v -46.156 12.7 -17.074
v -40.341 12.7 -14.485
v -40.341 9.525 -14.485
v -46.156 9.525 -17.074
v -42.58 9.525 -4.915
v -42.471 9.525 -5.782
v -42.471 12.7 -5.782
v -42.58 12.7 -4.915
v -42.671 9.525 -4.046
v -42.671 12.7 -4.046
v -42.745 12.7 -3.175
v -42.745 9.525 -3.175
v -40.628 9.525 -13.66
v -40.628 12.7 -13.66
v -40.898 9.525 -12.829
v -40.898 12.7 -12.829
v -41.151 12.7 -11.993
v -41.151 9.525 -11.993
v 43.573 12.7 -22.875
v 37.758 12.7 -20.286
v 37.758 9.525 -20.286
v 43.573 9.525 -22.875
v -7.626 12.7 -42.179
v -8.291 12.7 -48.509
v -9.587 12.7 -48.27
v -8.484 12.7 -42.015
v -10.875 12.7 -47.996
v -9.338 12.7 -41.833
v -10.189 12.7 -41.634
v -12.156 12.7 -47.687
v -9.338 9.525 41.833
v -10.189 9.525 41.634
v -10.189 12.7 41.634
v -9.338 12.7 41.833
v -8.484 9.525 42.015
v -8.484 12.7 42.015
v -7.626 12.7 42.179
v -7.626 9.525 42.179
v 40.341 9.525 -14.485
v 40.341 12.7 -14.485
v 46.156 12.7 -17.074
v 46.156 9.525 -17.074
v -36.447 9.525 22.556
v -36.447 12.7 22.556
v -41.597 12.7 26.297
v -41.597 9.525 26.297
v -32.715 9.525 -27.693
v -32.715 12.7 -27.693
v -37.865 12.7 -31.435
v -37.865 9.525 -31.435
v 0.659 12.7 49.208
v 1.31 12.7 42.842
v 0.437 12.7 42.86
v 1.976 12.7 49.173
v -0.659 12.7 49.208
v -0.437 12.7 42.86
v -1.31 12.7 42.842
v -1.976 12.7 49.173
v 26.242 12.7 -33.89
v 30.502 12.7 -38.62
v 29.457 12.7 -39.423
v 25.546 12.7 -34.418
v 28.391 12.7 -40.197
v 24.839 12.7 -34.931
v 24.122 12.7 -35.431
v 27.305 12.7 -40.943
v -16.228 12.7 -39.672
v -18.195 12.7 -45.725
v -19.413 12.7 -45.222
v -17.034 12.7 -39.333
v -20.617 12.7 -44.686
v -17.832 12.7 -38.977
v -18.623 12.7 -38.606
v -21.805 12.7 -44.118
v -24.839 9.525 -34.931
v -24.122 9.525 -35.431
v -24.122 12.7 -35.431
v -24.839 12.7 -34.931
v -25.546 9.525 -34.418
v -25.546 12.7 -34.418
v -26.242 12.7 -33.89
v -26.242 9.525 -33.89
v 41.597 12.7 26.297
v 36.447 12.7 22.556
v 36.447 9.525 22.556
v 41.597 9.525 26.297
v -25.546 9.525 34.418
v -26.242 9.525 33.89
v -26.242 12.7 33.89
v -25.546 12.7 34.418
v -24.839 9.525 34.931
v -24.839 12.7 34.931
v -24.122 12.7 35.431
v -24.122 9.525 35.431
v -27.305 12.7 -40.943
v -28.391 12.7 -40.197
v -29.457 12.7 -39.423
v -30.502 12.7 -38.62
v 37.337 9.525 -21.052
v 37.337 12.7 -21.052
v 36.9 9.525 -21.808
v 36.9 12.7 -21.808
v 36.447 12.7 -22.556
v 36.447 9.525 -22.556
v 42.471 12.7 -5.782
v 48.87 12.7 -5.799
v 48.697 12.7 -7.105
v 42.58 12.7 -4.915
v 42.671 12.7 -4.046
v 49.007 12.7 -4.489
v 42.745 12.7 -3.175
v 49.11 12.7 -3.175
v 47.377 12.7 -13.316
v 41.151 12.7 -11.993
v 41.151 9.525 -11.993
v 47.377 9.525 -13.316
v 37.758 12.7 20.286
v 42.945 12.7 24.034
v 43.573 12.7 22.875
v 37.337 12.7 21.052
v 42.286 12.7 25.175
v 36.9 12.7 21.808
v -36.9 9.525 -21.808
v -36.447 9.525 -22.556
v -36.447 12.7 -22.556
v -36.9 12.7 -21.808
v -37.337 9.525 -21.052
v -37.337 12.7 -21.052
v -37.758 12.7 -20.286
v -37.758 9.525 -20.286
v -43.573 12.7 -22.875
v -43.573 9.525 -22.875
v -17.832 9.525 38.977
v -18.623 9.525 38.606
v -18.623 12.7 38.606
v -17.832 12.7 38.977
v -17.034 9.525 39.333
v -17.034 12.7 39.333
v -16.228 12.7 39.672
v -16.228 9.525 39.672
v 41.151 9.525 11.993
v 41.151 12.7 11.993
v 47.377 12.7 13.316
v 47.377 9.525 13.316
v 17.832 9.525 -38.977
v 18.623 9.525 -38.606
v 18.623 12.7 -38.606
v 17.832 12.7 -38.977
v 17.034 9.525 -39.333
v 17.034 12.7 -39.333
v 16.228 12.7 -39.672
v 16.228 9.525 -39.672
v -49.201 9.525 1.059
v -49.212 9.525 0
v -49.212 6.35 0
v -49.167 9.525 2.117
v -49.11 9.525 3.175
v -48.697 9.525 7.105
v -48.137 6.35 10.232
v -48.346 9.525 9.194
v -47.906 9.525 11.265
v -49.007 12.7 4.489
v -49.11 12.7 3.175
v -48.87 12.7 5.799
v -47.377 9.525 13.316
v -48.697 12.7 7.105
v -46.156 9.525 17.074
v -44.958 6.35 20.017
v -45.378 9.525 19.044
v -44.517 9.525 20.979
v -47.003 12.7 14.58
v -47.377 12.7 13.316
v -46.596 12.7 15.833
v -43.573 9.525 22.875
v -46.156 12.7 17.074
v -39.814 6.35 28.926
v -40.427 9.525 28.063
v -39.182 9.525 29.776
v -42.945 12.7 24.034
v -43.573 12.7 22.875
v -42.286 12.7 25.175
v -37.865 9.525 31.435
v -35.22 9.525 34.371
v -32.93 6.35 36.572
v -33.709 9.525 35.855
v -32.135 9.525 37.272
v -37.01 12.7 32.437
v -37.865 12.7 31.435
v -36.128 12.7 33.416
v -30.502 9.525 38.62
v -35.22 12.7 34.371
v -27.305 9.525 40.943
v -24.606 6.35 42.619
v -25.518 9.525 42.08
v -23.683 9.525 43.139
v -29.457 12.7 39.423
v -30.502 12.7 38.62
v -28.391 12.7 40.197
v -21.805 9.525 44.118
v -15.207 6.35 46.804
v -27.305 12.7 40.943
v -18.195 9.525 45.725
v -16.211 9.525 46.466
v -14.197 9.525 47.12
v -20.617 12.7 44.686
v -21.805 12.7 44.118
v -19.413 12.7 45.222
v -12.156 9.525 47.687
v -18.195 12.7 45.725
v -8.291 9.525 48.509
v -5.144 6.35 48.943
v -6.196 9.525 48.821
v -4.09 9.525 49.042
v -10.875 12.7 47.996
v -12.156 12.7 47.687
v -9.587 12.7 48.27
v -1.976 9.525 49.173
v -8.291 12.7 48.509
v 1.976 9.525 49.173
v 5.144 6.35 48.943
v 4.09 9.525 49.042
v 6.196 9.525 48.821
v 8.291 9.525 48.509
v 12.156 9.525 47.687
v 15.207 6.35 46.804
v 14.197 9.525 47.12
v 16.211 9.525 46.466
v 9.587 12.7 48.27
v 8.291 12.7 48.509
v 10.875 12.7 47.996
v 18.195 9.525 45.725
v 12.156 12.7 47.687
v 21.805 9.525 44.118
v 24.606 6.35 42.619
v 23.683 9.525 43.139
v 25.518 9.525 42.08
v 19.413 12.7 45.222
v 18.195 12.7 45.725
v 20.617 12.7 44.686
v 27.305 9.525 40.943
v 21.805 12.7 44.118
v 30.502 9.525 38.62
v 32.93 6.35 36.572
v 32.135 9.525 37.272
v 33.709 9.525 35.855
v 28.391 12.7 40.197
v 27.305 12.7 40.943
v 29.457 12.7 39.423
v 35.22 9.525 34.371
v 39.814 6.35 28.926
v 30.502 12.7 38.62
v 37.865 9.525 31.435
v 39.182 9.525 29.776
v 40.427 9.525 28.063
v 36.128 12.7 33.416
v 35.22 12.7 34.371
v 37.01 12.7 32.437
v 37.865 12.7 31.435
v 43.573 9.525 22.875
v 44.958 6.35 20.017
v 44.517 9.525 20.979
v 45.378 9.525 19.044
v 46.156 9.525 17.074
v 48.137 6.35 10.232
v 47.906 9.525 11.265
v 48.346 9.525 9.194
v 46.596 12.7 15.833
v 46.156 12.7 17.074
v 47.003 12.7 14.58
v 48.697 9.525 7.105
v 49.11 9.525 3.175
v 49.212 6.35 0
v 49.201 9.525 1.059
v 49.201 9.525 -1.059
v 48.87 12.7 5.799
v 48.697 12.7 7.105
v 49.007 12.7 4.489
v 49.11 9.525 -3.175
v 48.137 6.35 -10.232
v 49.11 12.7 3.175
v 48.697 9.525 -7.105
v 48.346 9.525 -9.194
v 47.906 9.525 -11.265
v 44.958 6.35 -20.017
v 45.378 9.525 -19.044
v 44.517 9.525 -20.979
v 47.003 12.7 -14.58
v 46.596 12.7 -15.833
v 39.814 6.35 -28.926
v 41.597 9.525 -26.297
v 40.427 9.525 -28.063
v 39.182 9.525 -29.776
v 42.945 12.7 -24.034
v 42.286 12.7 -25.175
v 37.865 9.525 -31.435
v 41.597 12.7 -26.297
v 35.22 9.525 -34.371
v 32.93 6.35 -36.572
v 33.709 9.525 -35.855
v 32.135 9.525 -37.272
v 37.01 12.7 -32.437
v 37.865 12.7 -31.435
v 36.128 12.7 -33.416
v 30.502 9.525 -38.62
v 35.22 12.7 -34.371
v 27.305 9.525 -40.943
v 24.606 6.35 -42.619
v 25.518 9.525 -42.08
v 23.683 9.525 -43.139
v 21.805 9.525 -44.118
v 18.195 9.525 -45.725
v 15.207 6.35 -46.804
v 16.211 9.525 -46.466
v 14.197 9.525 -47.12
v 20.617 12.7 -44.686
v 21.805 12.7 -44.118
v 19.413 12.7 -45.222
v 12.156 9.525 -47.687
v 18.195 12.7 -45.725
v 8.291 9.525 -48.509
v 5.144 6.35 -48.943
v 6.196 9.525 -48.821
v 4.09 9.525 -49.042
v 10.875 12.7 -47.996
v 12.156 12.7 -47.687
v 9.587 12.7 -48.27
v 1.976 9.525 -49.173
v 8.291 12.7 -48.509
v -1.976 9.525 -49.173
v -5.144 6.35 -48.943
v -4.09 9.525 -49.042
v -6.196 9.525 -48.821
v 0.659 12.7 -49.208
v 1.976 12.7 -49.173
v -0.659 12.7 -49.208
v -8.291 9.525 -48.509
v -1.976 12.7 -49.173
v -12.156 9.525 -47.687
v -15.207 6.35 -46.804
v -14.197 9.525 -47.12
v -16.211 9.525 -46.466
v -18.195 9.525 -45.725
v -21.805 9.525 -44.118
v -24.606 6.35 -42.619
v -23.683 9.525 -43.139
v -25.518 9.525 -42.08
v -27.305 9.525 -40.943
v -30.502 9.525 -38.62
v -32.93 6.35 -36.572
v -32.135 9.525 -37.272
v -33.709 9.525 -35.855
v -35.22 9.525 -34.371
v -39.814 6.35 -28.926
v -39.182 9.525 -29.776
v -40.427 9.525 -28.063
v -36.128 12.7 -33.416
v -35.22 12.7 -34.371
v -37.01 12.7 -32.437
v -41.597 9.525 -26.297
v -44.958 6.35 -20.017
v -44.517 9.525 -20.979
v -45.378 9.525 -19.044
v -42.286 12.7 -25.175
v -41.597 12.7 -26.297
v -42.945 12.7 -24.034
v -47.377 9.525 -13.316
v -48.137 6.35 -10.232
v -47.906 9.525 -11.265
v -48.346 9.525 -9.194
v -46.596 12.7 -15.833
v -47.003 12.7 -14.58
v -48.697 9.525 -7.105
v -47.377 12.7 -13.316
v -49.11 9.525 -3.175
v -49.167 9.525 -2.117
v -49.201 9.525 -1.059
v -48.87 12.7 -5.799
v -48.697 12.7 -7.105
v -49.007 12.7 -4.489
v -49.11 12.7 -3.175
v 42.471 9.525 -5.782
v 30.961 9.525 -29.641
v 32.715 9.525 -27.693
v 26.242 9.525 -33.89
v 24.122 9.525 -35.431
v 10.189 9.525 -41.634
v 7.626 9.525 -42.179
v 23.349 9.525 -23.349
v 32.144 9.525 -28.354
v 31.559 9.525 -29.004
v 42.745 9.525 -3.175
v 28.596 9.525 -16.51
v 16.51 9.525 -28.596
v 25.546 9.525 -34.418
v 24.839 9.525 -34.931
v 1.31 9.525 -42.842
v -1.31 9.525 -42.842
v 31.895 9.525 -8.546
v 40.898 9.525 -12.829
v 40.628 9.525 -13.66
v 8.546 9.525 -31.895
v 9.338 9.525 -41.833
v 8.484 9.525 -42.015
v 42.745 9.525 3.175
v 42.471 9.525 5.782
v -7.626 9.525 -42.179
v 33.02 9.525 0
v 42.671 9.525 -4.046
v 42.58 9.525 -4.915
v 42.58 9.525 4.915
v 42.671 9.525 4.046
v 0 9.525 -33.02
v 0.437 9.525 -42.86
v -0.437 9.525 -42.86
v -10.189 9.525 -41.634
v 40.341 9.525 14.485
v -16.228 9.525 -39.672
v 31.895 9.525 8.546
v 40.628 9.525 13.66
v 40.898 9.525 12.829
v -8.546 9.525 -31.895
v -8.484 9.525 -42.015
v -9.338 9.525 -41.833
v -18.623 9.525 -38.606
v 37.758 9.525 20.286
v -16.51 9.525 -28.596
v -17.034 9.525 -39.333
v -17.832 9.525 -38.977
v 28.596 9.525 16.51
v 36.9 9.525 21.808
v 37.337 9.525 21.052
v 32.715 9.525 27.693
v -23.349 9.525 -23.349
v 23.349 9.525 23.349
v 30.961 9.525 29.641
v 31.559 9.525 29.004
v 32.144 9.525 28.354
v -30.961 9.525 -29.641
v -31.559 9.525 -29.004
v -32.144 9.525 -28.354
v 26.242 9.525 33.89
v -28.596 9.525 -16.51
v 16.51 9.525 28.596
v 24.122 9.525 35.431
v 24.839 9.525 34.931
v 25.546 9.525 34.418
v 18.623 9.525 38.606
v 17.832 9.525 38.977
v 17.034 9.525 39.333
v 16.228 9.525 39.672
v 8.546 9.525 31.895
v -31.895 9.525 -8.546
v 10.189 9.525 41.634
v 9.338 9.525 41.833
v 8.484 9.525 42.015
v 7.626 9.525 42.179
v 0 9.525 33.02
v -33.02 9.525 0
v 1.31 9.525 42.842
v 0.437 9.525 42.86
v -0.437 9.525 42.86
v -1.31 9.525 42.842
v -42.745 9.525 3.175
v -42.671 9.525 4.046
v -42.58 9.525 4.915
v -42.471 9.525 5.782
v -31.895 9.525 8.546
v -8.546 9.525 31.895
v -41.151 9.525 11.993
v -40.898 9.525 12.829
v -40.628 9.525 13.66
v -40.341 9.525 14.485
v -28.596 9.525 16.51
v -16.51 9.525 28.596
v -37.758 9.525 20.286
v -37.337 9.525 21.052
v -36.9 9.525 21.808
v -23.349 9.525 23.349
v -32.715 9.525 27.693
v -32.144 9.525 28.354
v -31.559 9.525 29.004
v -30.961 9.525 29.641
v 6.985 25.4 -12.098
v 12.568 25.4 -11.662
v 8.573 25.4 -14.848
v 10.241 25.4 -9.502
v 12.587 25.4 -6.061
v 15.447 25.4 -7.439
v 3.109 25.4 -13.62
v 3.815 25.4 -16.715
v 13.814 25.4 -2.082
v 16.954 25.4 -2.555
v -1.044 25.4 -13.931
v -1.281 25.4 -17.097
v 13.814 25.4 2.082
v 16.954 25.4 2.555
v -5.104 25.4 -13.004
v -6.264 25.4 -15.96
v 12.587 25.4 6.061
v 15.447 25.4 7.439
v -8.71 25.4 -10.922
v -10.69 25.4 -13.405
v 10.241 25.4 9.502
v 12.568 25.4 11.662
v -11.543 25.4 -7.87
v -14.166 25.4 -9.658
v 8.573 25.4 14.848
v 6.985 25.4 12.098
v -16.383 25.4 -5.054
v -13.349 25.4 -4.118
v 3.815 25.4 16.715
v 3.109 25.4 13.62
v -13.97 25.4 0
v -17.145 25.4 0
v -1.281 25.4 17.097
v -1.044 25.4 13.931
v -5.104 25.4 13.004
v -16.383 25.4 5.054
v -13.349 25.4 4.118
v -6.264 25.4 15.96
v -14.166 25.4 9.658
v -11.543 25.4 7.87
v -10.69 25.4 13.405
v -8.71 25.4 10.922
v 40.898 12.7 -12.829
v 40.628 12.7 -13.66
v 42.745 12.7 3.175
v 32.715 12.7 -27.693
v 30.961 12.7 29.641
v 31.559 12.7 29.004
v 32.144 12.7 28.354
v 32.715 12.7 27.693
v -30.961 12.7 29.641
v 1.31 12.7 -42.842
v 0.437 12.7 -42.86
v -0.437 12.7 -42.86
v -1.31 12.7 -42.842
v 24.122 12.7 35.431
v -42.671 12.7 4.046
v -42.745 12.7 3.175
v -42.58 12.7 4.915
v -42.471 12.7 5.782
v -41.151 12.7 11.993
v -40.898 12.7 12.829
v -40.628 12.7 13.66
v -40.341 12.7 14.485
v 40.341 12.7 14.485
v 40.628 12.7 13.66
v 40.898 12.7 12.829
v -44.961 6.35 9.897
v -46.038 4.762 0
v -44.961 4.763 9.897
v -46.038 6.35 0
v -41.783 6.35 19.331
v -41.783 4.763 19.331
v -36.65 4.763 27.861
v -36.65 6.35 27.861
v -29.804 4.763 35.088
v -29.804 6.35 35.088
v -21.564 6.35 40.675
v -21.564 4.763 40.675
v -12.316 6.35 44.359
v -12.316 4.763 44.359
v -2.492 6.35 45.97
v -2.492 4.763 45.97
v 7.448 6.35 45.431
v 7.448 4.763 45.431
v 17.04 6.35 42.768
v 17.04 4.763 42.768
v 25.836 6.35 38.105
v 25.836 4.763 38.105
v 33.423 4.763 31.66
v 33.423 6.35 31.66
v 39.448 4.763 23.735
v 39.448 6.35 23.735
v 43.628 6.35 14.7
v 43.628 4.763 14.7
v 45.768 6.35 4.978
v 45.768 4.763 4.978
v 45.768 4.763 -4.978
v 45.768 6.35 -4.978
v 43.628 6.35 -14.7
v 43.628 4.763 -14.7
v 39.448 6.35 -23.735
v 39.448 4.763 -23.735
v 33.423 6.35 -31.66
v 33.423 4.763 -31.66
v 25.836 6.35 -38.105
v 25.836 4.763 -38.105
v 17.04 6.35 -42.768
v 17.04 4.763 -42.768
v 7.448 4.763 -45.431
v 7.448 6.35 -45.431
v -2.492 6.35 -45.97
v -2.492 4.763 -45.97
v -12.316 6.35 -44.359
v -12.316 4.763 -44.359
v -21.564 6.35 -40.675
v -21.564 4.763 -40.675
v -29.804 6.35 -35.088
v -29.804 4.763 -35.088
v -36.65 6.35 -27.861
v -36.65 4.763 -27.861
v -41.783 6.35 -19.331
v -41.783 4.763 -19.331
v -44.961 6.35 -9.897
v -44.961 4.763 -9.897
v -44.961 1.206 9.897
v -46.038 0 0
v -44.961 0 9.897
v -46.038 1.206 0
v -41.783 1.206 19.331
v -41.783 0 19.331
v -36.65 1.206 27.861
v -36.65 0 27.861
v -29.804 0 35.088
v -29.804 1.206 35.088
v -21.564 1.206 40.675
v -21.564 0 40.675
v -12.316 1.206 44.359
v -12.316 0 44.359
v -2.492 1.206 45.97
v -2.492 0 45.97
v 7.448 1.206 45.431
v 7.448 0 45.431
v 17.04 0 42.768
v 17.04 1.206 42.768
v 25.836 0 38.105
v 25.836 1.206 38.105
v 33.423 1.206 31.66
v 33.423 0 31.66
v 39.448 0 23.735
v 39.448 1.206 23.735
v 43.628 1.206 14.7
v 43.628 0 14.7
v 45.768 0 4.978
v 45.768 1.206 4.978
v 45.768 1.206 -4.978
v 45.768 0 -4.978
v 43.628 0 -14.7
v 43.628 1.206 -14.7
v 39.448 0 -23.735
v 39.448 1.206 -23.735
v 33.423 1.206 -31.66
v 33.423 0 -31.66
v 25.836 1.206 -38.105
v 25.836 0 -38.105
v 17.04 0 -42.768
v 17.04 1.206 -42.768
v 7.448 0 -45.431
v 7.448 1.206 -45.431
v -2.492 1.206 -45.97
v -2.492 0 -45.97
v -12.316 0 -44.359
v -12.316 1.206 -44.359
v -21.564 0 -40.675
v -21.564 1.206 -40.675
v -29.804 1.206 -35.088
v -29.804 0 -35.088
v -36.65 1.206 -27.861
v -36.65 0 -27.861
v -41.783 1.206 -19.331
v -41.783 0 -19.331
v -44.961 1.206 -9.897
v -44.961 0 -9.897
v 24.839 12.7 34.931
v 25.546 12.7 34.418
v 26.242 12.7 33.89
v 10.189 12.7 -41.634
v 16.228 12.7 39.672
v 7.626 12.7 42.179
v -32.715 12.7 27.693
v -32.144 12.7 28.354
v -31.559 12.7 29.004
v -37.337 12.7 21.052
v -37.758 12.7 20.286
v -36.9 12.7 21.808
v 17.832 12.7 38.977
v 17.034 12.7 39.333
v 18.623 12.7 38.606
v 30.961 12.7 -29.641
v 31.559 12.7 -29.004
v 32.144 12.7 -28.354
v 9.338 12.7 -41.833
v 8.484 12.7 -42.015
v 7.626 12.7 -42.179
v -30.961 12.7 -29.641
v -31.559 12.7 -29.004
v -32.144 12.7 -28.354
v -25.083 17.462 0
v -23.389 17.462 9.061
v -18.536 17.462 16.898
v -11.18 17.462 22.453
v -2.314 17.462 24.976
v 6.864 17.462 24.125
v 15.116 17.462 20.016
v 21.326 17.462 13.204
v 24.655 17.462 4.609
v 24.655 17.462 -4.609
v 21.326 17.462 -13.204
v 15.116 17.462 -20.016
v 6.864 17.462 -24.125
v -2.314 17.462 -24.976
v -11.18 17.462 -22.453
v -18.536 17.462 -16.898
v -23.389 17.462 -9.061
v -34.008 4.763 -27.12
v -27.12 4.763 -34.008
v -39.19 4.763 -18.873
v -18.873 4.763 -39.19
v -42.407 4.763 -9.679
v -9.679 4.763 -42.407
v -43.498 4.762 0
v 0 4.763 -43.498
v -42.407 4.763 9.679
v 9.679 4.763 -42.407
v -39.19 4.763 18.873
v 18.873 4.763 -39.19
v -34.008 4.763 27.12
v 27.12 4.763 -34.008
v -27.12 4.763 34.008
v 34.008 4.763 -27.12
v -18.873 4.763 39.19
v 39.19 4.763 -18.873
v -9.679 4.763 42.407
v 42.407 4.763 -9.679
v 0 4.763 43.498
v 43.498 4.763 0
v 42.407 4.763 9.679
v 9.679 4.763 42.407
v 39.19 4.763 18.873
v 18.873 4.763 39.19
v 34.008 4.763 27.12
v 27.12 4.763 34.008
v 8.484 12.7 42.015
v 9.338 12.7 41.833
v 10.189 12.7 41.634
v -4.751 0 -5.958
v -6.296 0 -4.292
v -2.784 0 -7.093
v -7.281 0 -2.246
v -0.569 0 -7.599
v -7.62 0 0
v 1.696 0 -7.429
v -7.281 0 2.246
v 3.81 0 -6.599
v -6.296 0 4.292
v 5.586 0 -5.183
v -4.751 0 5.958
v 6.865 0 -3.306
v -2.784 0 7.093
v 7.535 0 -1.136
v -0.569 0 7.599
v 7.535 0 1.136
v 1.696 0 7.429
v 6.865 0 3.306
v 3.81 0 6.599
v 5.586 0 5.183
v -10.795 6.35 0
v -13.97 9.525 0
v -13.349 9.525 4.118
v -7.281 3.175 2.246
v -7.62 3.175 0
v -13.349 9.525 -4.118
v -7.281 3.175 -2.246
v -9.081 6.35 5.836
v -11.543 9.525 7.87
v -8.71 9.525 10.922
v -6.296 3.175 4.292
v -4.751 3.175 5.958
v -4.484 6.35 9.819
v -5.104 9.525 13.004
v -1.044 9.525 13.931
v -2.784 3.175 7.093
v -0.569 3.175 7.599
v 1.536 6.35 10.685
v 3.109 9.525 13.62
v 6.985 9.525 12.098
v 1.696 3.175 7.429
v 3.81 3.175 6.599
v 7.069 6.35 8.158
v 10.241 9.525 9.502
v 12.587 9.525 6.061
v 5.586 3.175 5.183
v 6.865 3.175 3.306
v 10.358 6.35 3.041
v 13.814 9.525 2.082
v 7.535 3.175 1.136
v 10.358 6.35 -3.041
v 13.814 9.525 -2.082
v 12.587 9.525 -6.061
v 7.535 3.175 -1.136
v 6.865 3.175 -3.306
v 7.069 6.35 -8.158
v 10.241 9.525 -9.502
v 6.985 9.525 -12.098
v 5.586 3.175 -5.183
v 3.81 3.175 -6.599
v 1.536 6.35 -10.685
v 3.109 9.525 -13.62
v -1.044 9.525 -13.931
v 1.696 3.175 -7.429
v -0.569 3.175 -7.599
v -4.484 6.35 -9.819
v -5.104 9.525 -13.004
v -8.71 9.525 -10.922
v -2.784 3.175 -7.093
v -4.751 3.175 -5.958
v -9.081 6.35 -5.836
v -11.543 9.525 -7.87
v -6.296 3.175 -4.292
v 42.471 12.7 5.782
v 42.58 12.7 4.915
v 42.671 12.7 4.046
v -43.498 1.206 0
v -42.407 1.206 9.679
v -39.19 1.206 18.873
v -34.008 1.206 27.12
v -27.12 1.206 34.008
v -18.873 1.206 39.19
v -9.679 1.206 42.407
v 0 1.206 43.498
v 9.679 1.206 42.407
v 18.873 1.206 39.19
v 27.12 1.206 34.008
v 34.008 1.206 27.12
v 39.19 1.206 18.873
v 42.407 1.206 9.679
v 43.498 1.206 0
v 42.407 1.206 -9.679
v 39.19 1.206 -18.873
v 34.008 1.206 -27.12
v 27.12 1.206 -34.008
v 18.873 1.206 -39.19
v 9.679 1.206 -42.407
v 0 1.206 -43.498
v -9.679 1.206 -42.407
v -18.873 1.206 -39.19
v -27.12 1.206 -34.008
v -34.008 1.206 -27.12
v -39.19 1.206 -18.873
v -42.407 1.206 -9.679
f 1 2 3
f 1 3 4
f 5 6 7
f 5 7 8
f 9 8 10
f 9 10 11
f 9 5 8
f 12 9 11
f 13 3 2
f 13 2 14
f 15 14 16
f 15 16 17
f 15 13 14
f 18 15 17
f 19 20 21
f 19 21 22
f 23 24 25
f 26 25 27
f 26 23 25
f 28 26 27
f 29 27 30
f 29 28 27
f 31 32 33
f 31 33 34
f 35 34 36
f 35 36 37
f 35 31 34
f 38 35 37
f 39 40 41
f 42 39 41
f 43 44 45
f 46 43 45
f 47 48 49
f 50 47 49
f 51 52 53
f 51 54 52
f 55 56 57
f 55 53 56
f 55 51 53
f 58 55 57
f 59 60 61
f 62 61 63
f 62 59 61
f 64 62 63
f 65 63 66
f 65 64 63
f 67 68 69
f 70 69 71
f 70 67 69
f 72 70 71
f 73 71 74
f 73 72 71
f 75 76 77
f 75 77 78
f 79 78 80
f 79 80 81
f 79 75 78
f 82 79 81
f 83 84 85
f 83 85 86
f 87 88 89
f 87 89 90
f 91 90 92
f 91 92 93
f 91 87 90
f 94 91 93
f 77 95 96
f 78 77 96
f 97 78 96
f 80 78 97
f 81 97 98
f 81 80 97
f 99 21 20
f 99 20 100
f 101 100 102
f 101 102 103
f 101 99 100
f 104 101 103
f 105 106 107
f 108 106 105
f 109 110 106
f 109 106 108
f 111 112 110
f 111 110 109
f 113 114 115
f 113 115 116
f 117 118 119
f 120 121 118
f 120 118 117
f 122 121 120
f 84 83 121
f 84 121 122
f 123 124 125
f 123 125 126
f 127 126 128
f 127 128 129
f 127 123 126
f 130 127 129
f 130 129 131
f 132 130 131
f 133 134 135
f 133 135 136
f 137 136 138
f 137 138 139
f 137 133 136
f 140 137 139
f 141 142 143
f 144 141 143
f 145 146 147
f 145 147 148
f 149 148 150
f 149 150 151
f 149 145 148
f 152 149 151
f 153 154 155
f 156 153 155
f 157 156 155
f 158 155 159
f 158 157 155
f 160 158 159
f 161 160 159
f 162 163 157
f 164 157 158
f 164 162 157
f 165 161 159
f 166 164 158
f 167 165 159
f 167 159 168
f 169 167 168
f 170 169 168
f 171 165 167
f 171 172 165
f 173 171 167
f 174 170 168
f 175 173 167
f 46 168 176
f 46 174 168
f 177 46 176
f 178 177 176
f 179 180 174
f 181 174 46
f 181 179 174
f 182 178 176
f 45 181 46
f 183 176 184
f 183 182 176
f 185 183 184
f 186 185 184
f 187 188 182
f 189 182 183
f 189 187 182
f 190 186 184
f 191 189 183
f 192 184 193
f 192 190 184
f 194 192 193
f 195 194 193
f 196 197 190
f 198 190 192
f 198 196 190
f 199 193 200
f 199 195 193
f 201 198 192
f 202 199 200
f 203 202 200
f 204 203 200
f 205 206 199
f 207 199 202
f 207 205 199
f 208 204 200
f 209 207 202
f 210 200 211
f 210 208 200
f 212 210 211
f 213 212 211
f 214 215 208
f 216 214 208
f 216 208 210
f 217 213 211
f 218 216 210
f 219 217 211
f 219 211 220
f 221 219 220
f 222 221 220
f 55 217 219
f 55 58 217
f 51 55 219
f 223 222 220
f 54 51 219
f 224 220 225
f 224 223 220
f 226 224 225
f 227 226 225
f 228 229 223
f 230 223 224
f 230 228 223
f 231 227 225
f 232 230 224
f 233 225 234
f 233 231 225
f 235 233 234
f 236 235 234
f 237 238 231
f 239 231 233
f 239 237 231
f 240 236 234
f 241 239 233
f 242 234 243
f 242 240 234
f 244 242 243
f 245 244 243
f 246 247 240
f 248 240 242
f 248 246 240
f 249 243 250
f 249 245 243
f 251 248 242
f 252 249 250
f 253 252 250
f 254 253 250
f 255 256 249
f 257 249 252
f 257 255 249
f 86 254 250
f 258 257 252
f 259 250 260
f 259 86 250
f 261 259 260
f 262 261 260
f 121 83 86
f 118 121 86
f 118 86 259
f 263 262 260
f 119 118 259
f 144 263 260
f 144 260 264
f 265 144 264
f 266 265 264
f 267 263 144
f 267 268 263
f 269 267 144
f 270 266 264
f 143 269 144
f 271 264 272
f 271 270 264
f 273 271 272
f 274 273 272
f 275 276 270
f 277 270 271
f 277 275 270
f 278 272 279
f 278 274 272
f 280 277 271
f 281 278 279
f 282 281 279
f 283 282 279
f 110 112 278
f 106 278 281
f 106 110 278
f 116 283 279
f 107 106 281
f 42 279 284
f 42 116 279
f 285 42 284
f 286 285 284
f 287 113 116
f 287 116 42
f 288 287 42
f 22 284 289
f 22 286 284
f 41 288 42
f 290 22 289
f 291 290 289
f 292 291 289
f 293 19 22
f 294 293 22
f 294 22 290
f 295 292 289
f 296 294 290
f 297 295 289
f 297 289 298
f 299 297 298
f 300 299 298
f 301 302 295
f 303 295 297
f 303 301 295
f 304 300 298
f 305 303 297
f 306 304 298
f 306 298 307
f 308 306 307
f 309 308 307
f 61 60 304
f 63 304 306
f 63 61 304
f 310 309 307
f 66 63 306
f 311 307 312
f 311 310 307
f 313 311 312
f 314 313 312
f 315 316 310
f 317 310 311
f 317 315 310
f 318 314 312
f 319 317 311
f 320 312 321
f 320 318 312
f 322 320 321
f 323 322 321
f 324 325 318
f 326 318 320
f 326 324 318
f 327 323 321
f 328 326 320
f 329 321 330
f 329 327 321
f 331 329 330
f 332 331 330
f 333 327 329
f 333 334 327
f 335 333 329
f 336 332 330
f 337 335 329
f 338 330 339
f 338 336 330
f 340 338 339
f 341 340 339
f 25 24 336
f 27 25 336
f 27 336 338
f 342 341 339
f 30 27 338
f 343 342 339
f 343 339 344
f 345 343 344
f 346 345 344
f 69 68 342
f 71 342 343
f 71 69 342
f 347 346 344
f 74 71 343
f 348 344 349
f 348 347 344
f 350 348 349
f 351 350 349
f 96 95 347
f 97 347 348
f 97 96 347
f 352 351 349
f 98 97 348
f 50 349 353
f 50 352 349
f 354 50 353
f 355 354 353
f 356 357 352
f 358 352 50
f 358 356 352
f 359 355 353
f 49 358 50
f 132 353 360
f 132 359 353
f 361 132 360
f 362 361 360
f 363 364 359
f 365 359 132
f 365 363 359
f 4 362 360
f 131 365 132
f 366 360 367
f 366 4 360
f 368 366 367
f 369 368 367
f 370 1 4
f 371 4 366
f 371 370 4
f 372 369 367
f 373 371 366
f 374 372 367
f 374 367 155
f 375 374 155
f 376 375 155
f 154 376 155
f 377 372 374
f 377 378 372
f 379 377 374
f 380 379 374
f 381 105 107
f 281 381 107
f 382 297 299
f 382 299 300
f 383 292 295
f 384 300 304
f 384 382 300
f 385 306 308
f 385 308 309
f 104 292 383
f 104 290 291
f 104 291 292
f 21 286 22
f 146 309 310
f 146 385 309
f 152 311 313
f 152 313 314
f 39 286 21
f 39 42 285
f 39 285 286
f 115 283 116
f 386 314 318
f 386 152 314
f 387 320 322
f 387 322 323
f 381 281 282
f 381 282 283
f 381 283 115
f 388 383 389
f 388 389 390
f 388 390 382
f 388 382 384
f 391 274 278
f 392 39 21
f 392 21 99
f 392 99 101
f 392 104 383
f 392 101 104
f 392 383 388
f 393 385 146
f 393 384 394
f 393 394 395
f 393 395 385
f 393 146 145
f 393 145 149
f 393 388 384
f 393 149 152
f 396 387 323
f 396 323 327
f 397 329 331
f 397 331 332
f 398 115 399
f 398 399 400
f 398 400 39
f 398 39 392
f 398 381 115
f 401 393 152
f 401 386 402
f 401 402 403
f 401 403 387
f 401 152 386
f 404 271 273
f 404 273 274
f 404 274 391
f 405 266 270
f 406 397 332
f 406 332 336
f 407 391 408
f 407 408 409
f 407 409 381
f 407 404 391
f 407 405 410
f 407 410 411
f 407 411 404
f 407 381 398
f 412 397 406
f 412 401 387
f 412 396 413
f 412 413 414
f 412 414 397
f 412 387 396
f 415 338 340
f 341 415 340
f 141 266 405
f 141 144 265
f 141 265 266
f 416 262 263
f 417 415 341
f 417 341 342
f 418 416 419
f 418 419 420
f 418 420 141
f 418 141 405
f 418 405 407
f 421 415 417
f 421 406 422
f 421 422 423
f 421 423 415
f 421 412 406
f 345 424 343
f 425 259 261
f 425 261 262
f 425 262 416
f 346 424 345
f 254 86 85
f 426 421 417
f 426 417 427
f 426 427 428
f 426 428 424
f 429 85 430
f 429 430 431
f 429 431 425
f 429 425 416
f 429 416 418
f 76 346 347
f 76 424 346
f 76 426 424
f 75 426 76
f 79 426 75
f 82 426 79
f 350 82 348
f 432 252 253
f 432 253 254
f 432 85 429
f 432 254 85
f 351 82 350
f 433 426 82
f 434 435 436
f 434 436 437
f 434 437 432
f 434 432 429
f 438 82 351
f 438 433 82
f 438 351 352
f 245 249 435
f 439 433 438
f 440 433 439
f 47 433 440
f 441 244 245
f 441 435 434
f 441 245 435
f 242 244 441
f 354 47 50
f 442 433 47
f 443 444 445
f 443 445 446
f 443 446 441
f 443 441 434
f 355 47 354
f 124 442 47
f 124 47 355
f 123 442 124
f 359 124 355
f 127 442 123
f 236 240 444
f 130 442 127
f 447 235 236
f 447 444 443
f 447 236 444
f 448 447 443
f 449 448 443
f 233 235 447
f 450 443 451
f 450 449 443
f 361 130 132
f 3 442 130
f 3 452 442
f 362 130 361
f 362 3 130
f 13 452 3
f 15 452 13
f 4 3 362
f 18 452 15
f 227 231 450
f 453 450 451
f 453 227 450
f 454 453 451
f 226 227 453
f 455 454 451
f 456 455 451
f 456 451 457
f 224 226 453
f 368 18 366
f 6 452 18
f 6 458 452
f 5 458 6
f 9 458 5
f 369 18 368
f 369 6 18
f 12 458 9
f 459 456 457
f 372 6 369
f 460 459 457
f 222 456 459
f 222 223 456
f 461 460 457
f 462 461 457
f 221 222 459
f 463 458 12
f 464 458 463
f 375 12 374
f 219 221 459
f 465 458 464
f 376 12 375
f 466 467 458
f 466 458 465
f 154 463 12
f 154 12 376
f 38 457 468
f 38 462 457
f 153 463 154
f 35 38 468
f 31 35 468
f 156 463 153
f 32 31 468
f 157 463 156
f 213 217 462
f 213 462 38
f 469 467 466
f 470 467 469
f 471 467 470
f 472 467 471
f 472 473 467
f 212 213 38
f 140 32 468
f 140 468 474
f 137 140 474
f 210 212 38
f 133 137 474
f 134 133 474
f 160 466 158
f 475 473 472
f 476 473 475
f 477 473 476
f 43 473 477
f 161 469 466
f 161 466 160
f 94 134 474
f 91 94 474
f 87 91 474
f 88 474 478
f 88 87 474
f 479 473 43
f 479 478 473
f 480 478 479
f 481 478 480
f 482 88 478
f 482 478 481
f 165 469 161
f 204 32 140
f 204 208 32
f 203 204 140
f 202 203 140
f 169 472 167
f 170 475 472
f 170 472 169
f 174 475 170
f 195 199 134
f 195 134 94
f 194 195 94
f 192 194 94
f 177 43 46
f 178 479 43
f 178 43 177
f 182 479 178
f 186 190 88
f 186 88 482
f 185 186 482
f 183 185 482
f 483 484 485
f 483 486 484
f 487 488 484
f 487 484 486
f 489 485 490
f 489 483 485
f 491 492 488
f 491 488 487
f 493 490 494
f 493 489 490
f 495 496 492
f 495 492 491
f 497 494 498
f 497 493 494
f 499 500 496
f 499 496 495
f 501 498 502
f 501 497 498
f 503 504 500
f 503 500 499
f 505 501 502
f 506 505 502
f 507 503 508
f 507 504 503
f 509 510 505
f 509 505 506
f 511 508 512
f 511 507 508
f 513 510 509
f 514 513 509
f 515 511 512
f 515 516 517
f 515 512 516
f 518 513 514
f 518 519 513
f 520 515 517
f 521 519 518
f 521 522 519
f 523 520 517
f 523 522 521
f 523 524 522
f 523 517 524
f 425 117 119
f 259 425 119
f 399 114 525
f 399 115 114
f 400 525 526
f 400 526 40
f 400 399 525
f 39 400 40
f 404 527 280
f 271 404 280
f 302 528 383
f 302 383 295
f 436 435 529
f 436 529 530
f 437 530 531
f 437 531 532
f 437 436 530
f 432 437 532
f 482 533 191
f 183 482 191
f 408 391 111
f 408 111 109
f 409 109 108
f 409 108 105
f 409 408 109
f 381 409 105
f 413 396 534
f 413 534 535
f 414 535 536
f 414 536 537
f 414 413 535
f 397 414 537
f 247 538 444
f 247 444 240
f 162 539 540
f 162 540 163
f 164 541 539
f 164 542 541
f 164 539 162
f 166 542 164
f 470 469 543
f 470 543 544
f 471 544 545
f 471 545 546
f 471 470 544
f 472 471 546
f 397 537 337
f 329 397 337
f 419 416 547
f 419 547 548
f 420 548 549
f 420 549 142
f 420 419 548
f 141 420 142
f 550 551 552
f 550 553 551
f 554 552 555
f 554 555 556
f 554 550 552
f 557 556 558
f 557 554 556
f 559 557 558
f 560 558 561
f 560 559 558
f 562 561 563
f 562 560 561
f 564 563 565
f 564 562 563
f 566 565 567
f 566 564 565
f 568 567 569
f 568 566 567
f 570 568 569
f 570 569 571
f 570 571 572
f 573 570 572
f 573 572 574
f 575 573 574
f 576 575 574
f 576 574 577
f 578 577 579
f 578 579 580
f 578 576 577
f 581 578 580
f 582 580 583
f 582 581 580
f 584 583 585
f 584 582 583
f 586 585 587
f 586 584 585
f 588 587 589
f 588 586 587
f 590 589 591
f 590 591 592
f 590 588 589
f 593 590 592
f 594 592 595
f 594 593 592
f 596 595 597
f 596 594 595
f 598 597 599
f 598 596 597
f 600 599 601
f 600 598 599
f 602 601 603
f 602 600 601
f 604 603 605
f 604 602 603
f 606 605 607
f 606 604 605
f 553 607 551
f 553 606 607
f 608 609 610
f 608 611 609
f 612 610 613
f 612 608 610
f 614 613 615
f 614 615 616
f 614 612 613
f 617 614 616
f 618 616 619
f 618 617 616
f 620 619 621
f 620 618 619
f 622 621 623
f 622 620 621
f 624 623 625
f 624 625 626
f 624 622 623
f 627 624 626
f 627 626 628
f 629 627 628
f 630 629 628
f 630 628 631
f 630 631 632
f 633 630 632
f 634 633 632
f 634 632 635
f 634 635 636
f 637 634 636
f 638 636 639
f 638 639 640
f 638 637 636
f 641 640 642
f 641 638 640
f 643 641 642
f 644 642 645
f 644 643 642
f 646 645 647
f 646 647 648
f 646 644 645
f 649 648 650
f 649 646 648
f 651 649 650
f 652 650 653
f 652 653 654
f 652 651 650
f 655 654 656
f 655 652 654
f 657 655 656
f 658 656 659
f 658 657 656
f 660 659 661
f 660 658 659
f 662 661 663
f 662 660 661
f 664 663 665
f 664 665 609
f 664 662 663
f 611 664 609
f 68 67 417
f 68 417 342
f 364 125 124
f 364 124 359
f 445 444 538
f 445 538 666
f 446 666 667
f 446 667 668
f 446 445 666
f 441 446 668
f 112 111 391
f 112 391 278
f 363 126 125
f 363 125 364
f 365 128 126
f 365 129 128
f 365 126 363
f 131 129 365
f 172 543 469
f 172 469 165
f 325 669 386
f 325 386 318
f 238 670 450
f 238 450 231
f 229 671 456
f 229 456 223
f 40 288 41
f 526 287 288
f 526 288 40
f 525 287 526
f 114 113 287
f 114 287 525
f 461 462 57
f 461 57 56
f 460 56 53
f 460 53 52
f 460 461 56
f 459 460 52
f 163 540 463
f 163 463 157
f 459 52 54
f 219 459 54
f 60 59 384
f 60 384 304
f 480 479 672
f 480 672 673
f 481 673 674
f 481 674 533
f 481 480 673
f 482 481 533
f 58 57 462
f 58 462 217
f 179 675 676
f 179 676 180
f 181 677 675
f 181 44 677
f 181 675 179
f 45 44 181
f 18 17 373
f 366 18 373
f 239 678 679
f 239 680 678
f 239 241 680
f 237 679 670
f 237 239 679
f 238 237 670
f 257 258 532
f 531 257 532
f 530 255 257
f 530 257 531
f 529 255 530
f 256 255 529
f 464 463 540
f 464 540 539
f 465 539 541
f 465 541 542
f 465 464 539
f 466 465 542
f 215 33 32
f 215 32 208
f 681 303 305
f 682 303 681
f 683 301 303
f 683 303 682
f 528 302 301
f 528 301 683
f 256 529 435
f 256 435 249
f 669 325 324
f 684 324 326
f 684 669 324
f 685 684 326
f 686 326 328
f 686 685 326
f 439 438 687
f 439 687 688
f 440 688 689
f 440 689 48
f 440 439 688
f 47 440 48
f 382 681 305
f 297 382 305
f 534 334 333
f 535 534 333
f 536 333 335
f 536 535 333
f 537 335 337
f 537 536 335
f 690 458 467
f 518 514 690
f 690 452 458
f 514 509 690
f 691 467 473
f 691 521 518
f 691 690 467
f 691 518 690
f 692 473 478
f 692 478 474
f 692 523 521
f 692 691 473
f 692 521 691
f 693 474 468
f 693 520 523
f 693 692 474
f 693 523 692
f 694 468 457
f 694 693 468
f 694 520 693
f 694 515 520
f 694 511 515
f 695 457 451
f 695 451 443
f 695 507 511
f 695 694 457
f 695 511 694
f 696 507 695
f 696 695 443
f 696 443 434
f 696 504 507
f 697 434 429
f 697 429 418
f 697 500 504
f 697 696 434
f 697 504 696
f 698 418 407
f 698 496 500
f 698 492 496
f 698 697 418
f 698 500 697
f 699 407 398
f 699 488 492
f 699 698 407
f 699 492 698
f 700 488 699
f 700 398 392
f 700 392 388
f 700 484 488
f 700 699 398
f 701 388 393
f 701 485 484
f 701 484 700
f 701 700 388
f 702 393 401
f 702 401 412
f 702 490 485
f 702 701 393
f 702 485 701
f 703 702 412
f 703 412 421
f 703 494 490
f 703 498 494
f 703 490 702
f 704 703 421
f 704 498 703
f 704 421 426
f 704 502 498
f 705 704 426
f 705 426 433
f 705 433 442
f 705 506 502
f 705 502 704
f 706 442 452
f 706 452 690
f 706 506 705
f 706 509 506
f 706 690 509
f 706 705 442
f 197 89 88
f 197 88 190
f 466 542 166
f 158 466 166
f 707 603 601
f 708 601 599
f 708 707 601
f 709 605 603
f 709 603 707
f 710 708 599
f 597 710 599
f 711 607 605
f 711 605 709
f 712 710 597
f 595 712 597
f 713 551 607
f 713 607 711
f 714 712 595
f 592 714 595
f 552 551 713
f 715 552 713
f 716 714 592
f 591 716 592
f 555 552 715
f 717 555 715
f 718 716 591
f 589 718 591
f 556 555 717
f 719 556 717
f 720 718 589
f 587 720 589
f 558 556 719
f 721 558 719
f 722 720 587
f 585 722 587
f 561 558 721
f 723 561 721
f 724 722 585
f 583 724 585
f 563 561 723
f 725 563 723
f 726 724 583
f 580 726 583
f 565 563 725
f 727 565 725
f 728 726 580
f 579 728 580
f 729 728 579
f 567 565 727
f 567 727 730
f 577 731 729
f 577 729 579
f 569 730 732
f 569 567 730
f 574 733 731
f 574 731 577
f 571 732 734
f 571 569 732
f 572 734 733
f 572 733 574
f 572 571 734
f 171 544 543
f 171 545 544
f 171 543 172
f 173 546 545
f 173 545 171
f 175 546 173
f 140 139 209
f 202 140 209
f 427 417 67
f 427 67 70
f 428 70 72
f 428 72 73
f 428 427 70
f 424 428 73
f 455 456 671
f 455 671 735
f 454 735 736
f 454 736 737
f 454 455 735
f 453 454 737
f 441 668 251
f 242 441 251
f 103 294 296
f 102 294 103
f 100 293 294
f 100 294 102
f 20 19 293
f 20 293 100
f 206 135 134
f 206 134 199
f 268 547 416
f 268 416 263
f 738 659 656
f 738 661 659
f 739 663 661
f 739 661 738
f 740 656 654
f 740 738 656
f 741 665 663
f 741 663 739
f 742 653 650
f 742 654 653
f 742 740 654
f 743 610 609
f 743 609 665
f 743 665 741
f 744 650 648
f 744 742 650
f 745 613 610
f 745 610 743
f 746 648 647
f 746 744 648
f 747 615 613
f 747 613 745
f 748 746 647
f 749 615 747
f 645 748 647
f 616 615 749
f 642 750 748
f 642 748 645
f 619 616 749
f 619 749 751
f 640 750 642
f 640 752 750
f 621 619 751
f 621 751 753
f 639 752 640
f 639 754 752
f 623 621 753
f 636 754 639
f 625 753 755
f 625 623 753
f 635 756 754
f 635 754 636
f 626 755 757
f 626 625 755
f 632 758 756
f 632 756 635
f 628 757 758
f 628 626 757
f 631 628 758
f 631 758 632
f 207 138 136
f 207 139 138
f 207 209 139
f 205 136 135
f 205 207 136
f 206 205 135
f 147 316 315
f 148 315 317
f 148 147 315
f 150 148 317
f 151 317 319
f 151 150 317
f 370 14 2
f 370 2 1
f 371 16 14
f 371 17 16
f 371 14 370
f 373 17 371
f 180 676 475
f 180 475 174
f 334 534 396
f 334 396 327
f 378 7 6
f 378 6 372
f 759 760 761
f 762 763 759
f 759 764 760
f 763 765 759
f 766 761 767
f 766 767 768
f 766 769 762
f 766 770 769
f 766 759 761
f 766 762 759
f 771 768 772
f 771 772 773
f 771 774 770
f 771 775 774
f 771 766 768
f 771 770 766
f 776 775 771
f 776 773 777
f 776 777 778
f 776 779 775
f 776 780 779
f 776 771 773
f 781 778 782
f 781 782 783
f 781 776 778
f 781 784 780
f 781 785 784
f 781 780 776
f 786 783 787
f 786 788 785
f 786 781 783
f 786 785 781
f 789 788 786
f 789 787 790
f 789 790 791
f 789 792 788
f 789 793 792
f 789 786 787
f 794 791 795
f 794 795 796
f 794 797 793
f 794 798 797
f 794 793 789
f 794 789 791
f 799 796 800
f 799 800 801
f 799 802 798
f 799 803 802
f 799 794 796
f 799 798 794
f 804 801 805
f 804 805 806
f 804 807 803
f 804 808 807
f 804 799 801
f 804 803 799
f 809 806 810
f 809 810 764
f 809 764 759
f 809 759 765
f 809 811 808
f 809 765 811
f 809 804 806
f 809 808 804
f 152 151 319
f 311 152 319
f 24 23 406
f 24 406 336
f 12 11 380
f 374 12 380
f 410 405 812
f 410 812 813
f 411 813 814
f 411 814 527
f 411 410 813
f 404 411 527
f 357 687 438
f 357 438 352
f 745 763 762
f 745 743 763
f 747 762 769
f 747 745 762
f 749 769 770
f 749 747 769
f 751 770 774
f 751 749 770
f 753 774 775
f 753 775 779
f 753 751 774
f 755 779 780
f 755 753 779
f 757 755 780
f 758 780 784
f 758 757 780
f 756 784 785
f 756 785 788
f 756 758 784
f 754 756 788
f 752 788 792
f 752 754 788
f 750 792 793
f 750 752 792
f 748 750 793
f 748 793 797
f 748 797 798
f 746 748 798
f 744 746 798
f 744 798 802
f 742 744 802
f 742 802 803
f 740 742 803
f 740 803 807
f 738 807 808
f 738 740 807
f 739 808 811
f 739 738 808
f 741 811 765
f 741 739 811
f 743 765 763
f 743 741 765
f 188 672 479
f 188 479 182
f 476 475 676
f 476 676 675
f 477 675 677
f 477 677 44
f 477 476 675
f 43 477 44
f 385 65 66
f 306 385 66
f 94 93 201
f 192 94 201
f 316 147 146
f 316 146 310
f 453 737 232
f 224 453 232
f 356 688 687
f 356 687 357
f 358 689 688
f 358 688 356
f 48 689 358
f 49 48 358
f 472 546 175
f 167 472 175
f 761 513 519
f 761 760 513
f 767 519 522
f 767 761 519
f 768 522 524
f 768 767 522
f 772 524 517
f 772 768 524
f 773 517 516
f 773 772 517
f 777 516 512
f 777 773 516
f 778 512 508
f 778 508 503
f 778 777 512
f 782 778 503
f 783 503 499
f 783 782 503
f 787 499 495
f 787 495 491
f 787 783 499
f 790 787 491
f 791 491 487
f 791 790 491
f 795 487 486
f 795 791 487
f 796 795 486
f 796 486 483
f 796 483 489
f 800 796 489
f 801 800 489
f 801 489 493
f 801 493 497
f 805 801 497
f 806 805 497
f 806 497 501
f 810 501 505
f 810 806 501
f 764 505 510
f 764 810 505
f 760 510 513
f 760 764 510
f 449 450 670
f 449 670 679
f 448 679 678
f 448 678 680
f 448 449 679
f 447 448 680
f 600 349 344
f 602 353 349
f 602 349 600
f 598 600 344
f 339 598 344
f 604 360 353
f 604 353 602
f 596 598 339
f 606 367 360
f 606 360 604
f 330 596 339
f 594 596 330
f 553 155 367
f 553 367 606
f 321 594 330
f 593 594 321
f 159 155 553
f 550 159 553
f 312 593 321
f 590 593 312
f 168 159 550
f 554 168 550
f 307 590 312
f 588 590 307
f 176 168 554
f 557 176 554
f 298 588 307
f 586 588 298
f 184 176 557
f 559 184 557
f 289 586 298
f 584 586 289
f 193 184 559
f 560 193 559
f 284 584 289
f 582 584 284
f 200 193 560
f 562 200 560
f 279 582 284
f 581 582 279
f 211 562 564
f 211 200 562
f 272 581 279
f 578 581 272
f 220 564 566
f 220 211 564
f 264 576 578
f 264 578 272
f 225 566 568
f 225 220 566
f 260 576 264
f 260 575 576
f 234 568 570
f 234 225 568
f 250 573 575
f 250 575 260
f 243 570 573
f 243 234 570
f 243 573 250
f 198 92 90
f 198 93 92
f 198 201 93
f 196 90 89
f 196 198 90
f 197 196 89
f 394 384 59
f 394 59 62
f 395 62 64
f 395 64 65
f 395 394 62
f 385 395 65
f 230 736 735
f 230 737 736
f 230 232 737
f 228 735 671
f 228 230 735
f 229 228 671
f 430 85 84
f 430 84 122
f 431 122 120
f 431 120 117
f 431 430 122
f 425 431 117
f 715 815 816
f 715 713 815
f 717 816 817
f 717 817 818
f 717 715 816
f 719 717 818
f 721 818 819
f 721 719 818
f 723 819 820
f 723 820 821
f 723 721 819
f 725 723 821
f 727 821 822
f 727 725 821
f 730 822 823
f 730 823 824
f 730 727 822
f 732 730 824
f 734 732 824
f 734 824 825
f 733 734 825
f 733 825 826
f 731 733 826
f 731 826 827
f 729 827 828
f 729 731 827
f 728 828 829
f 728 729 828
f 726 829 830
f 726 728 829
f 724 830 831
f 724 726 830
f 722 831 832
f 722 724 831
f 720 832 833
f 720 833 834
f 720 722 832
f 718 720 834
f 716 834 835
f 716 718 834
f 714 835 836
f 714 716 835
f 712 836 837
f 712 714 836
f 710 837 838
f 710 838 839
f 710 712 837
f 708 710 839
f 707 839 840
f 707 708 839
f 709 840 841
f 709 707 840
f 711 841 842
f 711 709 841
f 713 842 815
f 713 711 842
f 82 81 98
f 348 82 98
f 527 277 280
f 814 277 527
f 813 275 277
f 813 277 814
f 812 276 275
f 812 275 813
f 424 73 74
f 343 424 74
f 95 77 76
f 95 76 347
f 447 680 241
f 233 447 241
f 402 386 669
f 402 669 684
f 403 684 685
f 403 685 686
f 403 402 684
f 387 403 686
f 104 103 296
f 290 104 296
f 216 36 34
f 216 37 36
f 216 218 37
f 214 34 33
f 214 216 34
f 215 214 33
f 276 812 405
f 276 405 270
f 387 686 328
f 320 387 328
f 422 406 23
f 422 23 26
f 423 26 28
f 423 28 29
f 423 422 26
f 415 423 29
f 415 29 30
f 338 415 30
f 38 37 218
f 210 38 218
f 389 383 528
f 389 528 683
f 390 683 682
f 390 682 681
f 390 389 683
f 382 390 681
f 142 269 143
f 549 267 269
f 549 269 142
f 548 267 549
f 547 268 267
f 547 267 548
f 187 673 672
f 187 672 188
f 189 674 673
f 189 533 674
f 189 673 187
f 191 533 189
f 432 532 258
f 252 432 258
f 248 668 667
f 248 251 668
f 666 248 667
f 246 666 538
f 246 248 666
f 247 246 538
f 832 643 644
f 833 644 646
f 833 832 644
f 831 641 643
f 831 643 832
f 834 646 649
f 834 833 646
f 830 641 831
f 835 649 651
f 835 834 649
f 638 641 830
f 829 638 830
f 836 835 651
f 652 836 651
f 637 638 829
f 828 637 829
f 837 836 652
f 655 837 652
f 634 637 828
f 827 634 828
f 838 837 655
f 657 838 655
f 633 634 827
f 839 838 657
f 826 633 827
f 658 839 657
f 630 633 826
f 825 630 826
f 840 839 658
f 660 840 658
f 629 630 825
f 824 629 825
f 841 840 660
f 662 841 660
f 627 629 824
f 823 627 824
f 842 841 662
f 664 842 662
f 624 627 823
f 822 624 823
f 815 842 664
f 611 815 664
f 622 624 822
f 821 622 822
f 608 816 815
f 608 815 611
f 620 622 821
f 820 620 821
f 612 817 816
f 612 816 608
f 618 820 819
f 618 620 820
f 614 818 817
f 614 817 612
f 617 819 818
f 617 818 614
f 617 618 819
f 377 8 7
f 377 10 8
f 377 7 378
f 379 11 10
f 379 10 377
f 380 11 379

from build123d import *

# Parameters (mm, degrees)
SKETCH2_W          = 12.7
SKETCH2_H          = 6.35
CUT_EXTRUDE1_DEPTH = 3.175
CIRPATTERN1_COUNT  = 30


with BuildPart() as part:
    # Sketch1 → Revolve1 (revolve)
    with BuildSketch(Plane.XY):
        Polygon((-7.62, 0), (-46.0375, 0), (-46.0375, 1.2065), (-43.4975, 1.2065), (-43.4975, 4.7625), (-46.0375, 4.7625), (-46.0375, 6.35), (-49.2125, 6.35), (-49.2125, 12.7), (-42.8625, 12.7), (-42.8625, 9.525), (-33.02, 9.525), (-17.145, 25.4), (-13.97, 25.4), (-13.97, 9.525), (-7.62, 3.175), align=None)
    revolve(axis=Axis((0, -42.3, 0), (0, 1, 0)))

    # Sketch2 → Cut-Extrude1 (cut)
    with BuildSketch(Plane(origin=(0, 12.7, 0), x_dir=(1, 0, 0), z_dir=(0, 1, 0))):
        with Locations((49.094745657, 0)):
            Rectangle(SKETCH2_W, SKETCH2_H)
    cut_extrude1 = extrude(amount=-CUT_EXTRUDE1_DEPTH, mode=Mode.SUBTRACT)

    # CirPattern1: Cut-Extrude1 ×30 about axis
    cirpattern1_axis = Axis((0, 0, 0), (0, 1, 0))
    for i in range(1, CIRPATTERN1_COUNT):
        add(cut_extrude1.rotate(cirpattern1_axis, i * 360 / CIRPATTERN1_COUNT), mode=Mode.SUBTRACT)


solid = part.part
